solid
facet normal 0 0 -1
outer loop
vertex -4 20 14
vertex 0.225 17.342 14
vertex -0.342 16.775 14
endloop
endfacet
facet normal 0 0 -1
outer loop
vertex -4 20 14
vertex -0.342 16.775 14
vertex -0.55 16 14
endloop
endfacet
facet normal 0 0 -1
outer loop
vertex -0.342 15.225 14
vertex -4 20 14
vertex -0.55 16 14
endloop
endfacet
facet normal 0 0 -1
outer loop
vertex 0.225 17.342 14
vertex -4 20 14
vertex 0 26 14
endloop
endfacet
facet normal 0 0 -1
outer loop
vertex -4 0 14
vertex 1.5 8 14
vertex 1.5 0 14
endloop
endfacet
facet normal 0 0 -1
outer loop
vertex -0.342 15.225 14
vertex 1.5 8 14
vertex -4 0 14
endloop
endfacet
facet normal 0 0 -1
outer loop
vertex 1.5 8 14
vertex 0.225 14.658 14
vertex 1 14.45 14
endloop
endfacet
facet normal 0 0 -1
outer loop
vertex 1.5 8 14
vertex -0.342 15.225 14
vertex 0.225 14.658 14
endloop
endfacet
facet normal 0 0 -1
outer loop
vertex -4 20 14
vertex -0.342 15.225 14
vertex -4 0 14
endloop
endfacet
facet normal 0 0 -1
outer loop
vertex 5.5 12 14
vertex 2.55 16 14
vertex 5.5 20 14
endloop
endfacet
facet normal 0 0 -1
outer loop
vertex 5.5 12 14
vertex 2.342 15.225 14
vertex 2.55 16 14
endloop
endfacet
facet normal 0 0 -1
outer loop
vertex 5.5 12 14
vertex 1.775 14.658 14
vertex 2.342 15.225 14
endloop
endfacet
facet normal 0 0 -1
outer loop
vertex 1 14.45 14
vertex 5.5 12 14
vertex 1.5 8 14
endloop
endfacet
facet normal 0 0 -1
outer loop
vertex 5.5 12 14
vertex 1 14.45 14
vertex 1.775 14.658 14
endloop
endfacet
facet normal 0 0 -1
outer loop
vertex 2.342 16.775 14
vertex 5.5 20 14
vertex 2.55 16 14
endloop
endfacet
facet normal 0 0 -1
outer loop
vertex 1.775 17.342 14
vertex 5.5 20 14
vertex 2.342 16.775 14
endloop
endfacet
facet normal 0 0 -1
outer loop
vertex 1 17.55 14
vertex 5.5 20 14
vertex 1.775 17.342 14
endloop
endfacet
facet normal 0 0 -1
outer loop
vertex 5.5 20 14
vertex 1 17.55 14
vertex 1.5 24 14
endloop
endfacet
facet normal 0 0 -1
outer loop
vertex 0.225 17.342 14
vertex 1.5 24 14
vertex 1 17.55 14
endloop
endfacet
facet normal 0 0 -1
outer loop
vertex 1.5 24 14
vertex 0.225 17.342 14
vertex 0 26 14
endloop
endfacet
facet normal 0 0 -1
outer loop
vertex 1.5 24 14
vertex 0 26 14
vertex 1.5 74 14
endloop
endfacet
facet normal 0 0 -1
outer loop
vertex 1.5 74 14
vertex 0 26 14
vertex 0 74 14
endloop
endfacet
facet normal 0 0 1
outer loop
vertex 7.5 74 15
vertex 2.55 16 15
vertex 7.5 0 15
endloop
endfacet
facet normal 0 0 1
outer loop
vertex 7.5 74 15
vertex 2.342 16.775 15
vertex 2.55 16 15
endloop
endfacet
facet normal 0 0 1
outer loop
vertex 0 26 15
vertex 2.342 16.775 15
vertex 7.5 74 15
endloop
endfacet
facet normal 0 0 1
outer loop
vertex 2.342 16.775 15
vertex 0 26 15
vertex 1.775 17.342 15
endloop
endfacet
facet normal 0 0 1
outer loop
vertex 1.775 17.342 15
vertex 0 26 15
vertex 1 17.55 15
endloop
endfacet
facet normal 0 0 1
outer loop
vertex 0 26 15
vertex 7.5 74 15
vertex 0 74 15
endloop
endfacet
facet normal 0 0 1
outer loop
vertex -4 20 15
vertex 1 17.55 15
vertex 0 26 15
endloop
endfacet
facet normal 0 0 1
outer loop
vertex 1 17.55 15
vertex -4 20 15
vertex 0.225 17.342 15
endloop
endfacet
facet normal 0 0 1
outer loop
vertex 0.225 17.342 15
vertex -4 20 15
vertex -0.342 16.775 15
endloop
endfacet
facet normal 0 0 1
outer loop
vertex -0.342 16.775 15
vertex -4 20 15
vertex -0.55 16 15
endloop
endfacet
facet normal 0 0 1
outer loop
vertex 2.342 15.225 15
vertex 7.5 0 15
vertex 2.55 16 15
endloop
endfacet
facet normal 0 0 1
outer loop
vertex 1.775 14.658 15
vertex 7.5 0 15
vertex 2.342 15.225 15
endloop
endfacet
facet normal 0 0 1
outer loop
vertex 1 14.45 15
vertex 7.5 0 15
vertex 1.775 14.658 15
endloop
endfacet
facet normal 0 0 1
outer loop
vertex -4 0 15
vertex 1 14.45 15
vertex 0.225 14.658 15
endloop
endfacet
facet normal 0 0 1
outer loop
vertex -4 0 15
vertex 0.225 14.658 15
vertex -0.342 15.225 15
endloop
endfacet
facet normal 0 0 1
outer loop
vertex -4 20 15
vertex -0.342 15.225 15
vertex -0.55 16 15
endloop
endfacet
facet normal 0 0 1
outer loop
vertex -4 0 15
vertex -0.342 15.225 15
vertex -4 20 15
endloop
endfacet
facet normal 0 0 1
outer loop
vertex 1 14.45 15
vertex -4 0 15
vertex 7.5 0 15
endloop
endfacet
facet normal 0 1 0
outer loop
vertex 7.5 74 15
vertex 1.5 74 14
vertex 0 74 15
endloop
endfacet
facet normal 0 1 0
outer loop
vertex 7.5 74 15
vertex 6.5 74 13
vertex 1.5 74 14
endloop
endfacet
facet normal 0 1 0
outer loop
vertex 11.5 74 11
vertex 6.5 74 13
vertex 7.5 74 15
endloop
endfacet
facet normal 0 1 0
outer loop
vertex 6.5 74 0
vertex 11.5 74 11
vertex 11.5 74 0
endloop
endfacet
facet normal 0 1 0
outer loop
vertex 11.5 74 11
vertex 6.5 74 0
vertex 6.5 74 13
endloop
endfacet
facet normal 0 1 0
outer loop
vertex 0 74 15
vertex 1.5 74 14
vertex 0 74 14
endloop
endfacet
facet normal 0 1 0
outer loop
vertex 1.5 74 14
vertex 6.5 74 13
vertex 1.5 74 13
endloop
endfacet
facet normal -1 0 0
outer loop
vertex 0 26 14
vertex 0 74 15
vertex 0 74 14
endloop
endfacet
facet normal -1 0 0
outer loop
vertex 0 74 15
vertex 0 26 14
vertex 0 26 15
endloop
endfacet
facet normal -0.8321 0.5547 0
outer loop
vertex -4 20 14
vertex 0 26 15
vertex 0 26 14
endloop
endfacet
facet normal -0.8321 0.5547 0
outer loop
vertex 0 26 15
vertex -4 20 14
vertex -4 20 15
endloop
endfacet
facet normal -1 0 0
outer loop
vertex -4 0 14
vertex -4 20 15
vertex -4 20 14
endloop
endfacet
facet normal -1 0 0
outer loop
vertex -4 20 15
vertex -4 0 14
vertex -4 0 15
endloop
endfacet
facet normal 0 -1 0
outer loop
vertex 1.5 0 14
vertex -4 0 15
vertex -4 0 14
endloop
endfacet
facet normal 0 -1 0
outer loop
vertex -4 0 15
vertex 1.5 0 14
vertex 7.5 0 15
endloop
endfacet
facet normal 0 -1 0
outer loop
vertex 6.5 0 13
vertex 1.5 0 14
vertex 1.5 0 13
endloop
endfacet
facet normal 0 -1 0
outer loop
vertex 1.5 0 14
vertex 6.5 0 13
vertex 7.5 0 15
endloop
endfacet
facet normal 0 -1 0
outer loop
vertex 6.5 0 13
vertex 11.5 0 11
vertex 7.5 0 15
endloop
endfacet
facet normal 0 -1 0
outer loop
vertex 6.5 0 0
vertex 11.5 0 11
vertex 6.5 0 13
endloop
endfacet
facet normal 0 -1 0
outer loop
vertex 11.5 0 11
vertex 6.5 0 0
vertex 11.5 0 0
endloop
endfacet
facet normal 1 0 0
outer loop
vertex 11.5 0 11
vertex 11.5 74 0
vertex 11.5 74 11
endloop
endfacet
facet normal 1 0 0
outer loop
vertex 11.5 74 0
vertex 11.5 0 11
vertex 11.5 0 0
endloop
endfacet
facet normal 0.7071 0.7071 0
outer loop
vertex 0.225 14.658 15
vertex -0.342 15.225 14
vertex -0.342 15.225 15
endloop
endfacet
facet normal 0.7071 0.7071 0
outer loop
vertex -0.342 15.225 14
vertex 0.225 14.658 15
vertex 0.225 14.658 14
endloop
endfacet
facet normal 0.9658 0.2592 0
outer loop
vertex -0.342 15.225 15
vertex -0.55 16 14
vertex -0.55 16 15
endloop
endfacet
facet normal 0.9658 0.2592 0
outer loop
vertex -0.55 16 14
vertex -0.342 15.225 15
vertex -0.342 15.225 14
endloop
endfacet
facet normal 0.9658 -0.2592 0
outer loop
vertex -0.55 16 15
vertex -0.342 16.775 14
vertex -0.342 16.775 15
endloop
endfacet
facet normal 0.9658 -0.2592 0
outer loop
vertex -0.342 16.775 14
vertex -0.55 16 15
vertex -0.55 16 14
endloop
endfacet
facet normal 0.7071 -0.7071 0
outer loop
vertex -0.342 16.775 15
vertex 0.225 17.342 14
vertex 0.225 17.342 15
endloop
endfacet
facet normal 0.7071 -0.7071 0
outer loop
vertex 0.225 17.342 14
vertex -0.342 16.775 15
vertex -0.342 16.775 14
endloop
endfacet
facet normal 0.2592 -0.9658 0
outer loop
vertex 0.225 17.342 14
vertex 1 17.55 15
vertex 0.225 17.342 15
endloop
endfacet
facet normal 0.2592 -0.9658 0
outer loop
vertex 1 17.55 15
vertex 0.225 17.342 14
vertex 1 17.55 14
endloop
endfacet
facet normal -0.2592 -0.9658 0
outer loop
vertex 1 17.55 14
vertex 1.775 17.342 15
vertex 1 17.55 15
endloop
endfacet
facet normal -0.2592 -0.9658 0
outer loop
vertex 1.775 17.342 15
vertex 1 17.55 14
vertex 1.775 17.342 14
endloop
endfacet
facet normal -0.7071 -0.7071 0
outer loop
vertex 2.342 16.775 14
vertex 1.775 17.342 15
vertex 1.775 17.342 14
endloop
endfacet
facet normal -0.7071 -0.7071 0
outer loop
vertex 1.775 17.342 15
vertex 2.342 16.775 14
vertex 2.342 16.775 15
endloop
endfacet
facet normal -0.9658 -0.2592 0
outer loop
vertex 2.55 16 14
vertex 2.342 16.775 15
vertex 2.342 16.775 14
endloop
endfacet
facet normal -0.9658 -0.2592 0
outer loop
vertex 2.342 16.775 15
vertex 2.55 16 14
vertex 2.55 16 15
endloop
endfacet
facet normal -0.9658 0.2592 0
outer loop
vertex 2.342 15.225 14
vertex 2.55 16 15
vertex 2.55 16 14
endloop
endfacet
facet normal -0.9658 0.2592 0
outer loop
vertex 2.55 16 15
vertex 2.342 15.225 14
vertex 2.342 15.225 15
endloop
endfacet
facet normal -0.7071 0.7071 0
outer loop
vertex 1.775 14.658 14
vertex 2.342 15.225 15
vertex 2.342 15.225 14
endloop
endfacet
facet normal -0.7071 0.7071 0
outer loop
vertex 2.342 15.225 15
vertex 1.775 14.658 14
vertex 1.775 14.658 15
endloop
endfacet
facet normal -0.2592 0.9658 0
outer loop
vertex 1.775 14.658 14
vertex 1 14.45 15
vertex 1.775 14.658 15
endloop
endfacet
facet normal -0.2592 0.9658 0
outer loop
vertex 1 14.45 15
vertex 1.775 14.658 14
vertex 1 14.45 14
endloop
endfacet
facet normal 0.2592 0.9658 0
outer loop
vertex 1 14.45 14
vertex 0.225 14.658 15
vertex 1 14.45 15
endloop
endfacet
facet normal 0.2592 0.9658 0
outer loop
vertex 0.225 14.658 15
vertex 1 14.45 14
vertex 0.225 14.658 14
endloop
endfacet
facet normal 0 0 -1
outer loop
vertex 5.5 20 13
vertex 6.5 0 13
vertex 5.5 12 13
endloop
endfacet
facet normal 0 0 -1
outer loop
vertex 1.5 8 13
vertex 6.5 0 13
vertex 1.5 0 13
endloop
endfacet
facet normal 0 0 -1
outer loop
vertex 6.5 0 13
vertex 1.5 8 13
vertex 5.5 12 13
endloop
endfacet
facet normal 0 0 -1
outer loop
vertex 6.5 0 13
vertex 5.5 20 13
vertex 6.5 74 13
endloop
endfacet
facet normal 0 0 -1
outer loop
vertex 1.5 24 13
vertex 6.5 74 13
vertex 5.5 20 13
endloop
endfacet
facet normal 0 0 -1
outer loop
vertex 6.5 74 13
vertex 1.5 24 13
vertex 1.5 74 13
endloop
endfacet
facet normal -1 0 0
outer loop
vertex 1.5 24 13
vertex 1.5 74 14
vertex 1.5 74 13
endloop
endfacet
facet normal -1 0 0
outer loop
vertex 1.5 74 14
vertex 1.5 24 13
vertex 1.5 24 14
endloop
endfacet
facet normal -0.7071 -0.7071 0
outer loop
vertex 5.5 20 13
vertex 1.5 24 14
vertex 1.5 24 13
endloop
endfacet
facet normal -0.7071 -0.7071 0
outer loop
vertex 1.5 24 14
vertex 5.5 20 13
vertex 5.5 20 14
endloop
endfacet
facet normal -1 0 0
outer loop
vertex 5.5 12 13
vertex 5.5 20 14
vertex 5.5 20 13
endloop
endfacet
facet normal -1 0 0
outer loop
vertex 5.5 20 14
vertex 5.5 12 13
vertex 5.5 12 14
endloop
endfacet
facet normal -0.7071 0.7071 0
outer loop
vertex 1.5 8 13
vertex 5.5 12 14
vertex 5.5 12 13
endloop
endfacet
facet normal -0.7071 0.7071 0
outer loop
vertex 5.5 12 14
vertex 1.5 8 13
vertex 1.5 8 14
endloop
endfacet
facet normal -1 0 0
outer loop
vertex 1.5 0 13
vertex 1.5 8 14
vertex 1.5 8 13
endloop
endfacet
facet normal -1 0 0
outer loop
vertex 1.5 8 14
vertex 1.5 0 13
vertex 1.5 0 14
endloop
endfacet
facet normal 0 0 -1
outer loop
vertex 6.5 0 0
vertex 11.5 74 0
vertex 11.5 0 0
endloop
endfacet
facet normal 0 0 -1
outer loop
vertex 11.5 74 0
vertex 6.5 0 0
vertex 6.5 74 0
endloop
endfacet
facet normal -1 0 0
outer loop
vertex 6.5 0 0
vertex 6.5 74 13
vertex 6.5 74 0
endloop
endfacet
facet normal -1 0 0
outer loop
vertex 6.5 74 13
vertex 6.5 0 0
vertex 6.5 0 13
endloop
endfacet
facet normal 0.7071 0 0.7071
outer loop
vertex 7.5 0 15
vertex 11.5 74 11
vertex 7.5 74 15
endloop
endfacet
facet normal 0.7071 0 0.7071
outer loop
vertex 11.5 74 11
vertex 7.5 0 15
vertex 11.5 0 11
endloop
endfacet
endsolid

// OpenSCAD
module base(){
    linear_extrude(1){
        difference() {
            union() {
                square([11.5, 74]);
                polygon([[0, 0], [0, 26], [-4, 20], [-4, 0]]);
            };
            translate([1, 16])circle(1.55, $fn=12);
        };
    };
};
module base2(){
    linear_extrude(1){
        translate([1.5, 0]) difference(){
            square([10, 74]);
            polygon ([[0, 8], [0, 24], [4, 20], [4, 12]]);
        };
    };
};

module wall(){
    linear_extrude(13){
        translate([6.5, 0]) square([5, 74]);
    };
};

module ramp() {
    translate([11.5, 0, 15])
    rotate(a=[270, 90, 0])
    linear_extrude(74) polygon([[0, 0], [0, 4], [4, 0]]);
};

difference() {
    union() {
        translate([0, 0, 14]) base();
        translate([0, 0, 13]) base2();
        wall();
    };
    ramp();
}
